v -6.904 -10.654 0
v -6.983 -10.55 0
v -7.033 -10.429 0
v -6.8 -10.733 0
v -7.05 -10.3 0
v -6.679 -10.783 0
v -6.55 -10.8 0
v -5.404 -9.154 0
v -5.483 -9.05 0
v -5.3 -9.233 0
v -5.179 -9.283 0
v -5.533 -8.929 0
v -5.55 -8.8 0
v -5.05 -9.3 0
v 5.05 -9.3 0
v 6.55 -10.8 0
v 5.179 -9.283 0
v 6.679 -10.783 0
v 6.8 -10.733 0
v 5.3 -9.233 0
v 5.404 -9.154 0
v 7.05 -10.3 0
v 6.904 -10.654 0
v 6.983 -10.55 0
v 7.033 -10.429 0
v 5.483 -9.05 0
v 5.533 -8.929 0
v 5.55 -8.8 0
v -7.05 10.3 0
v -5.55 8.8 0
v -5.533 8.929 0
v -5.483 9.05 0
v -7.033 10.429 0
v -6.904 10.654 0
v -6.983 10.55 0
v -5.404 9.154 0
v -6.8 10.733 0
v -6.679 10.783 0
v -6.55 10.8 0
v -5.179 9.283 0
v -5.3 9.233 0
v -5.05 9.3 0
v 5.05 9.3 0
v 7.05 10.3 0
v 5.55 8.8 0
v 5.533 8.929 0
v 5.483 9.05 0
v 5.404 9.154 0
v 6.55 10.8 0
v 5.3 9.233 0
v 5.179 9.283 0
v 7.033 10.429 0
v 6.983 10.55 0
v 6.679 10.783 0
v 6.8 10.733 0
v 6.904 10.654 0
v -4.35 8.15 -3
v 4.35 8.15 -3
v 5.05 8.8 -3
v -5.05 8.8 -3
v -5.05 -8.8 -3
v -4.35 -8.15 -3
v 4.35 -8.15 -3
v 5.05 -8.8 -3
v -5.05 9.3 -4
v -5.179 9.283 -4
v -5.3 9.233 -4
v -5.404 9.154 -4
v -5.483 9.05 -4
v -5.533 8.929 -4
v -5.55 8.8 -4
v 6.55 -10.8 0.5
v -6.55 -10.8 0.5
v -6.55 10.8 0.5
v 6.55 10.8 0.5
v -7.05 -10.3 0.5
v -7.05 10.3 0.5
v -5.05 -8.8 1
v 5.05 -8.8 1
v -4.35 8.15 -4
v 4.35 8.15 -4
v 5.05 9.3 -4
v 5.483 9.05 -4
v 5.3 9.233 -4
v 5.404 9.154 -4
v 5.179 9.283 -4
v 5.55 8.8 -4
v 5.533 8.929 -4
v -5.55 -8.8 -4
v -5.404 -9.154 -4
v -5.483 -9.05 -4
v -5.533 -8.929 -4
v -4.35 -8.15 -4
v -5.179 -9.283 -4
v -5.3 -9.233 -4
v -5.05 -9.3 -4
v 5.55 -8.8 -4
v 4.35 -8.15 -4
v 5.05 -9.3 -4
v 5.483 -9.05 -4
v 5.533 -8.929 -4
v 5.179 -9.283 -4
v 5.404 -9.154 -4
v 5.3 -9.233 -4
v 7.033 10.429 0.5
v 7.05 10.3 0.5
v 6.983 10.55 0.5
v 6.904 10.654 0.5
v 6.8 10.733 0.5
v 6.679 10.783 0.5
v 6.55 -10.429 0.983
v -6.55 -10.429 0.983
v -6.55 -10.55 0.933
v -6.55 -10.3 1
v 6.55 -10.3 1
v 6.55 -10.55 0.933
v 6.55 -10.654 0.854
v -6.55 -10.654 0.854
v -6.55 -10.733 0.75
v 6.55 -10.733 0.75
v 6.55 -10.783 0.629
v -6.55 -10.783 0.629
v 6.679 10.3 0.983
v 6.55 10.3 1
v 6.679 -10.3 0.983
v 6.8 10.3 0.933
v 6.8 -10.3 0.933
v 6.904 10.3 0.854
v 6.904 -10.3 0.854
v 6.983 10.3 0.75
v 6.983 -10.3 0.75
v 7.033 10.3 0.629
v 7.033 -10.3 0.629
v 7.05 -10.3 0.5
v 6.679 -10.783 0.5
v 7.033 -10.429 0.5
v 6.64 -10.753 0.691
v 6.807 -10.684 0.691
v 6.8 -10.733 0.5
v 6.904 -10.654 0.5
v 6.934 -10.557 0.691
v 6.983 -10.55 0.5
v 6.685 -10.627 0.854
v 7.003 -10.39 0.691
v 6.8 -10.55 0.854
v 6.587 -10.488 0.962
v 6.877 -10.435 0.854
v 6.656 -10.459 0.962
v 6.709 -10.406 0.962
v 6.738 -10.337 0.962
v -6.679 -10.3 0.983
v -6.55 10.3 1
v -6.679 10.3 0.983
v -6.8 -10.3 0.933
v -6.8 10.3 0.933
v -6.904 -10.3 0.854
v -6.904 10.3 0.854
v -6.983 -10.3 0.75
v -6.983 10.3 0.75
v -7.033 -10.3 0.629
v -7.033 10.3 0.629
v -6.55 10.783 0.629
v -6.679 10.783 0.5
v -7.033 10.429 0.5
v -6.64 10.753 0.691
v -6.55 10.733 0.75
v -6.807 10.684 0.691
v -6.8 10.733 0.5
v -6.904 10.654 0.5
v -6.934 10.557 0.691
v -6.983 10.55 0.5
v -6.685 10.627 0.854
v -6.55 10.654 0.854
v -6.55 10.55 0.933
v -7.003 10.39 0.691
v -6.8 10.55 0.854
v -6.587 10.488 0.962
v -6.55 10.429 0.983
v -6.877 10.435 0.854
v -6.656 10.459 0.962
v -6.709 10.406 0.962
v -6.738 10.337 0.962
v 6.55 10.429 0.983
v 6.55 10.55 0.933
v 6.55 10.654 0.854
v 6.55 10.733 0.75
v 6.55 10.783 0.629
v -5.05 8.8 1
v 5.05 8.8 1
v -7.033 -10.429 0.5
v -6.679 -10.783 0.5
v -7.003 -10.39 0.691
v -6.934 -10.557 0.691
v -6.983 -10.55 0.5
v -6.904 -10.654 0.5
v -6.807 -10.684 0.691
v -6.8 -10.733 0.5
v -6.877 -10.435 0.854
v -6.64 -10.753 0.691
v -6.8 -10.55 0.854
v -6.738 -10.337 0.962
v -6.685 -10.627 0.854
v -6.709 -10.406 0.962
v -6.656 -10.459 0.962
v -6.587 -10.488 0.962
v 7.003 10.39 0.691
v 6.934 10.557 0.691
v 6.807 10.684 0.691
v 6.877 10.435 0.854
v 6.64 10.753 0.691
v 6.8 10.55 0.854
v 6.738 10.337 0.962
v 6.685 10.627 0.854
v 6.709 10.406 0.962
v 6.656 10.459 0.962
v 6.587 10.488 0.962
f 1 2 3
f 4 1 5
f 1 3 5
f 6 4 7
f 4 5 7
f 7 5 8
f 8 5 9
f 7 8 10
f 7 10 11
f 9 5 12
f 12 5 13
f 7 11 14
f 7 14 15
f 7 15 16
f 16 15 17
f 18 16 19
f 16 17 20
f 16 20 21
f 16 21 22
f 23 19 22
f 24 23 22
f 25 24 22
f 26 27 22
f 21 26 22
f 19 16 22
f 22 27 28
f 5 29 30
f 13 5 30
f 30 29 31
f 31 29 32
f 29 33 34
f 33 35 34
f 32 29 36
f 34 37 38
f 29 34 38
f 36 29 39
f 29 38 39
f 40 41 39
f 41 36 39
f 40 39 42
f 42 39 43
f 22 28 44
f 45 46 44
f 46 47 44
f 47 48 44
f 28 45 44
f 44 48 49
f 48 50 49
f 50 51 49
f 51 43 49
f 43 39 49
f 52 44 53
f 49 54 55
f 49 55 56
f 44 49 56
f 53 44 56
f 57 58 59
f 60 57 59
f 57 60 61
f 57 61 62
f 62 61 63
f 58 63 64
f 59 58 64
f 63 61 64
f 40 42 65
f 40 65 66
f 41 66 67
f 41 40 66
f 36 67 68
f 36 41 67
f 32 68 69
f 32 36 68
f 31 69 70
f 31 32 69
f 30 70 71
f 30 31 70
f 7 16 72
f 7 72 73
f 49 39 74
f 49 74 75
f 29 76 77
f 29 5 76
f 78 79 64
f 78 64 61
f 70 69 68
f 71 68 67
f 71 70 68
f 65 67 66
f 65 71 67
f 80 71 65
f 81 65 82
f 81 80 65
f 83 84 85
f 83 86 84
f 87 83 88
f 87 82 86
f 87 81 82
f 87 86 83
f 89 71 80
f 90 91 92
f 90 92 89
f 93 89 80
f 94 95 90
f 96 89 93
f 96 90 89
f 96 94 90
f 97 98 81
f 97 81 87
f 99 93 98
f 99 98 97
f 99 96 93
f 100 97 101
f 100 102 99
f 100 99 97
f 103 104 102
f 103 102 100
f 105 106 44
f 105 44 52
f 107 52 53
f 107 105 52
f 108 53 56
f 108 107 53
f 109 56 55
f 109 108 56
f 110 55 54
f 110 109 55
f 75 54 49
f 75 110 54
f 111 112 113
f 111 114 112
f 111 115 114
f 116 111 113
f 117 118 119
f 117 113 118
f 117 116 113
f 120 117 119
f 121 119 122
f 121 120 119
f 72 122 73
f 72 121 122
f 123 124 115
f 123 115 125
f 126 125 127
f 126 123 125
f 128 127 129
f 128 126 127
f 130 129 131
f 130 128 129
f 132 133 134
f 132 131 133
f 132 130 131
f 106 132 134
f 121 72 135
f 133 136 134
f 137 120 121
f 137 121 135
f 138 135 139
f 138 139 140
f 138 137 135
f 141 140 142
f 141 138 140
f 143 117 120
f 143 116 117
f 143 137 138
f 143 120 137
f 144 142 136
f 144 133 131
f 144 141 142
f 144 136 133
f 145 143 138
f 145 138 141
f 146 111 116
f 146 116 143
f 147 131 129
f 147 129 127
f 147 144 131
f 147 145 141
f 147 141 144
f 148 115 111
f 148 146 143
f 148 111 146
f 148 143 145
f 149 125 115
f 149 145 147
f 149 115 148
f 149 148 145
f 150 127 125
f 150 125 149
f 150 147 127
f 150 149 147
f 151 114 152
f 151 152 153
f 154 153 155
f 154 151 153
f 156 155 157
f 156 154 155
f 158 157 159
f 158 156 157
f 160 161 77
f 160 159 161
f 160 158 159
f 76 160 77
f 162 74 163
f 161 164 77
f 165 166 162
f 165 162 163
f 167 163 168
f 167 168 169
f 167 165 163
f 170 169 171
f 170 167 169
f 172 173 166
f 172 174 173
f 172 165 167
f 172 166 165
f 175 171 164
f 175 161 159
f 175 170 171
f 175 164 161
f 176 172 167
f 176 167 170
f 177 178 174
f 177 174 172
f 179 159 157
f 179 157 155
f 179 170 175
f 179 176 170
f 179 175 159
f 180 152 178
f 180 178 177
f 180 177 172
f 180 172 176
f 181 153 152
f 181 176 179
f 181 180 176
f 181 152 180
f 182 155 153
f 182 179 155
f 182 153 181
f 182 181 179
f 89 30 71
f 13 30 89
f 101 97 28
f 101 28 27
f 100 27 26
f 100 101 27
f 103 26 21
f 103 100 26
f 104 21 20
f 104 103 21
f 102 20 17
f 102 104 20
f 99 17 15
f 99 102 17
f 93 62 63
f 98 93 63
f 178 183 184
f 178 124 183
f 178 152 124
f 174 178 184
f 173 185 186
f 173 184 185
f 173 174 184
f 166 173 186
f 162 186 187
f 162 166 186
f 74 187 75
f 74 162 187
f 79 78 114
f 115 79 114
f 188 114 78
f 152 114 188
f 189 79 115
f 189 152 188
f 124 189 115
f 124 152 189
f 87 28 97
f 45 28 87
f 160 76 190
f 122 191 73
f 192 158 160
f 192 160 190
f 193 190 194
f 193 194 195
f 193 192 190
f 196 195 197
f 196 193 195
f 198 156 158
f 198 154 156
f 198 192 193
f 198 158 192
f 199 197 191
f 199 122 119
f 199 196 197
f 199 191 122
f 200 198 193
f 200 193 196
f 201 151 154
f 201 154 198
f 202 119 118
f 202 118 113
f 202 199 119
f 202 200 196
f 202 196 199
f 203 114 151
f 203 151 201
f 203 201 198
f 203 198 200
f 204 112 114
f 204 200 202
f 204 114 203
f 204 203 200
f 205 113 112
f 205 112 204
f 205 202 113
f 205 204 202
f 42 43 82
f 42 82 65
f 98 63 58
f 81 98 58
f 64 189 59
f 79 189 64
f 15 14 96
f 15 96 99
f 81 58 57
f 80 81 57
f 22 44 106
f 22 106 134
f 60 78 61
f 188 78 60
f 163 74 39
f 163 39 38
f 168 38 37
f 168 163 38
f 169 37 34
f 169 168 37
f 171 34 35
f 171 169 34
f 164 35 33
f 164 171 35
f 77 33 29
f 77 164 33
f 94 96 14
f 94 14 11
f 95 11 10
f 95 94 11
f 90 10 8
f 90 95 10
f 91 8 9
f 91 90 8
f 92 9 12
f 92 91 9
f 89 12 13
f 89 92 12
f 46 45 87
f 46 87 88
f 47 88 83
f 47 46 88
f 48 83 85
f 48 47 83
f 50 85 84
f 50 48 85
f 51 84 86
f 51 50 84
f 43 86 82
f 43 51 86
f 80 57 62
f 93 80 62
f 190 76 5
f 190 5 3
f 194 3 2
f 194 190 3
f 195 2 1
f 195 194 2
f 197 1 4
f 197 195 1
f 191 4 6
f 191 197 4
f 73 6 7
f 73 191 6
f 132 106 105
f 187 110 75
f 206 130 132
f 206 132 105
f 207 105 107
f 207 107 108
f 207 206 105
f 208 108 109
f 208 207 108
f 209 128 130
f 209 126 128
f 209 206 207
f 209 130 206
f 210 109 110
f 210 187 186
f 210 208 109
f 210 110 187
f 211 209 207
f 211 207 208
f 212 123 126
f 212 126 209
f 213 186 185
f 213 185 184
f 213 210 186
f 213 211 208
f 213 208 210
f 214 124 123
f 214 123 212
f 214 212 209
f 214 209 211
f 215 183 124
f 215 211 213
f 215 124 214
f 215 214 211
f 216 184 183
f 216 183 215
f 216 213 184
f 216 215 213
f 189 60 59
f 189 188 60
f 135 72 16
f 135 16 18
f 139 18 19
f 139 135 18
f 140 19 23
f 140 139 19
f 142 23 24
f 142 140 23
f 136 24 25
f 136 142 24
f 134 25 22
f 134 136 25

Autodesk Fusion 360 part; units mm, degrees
sketch "Sketch1" plane through (0, 0, 0) normal (0, 0, 1) x (1, 0, 0)
  line L0 (5.55, 9.3) -> (-5.55, 9.3)
  line L1 (-5.55, 9.3) -> (-5.55, -9.3)
  line L2 (-5.55, -9.3) -> (5.55, -9.3)
  line L3 (5.55, -9.3) -> (5.55, 9.3)
  line L4 (5.55, 9.3) -> (-5.55, -9.3) construction
  line L5 (-5.55, 9.3) -> (5.55, -9.3) construction
  line L6 (7.05, -10.8) -> (-7.05, -10.8)
  line L7 (-7.05, -10.8) -> (-7.05, 10.8)
  line L8 (-7.05, 10.8) -> (7.05, 10.8)
  line L9 (7.05, 10.8) -> (7.05, -10.8)
  line L10 (7.05, -10.8) -> (-7.05, 10.8) construction
  line L11 (-7.05, -10.8) -> (7.05, 10.8) construction
  line L12 (5.05, -8.8) -> (-5.05, -8.8)
  line L13 (-5.05, -8.8) -> (-5.05, 8.8)
  line L14 (-5.05, 8.8) -> (5.05, 8.8)
  line L15 (5.05, 8.8) -> (5.05, -8.8)
  line L16 (5.05, -8.8) -> (-5.05, 8.8) construction
  line L17 (-5.05, -8.8) -> (5.05, 8.8) construction
  dimension "d1" = 11.1
  dimension "d2" = 18.6
  dimension "d3" = 14.1
  dimension "d4" = 21.6
  dimension "d5" = 10.1
  dimension "d6" = 17.6
extrude "Extrude1" add sketch "Sketch1" along normal blind 1 contours L0 L1 L2 L3 | L6 L7 L8 L9
extrude "Extrude2" add sketch "Sketch1" against normal blind 3 contours L0 L1 L2 L3
sketch "Sketch2" plane through (0, 0, -3) normal (0, 0, -1) x (1, 0, 0)
  line L0 (5.05, -8.8) -> (-5.05, -8.8)
  line L1 (-5.05, -8.8) -> (-5.05, 8.8)
  line L2 (-5.05, 8.8) -> (5.05, 8.8)
  line L3 (5.05, 8.8) -> (5.05, -8.8)
  line L4 (5.55, -9.3) -> (5.55, 9.3)
  line L5 (5.55, 9.3) -> (-5.55, 9.3)
  line L6 (-5.55, 9.3) -> (-5.55, -9.3)
  line L7 (-5.55, -9.3) -> (5.55, -9.3)
  line L8 (5.55, -9.3) -> (-5.55, -9.3)
  line L9 (-5.55, -9.3) -> (-5.55, 9.3)
  line L10 (-5.55, 9.3) -> (5.55, 9.3)
  line L11 (5.55, 9.3) -> (5.55, -9.3)
  line L12 (5.55, -9.3) -> (-5.55, 9.3) construction
  line L13 (-5.55, -9.3) -> (5.55, 9.3) construction
  line L14 (4.35, -8.15) -> (-4.35, -8.15)
  line L15 (-4.35, -8.15) -> (-4.35, 8.15)
  line L16 (-4.35, 8.15) -> (4.35, 8.15)
  line L17 (4.35, 8.15) -> (4.35, -8.15)
  line L18 (4.35, -8.15) -> (-4.35, 8.15) construction
  line L19 (-4.35, -8.15) -> (4.35, 8.15) construction
  dimension "d11" = 8.7
  dimension "d12" = 16.3
extrude "Extrude3" add sketch "Sketch2" along normal blind 1 contours L0 L1 L2 L3 | L4 L5 L6 L7 L8 L9 L10 L11
fillet "Fillet1" radius 0.5 8 edges at (-7.05, -10.8, 0.5) (7.05, -10.8, 0.5) (-5.55, -9.3, -2) (5.55, -9.3, -2) (-5.55, 9.3, -2) (-7.05, 10.8, 0.5) (5.55, 9.3, -2) (7.05, 10.8, 0.5)
fillet "Fillet2" radius 0.5 8 edges at (6.9036, -10.6536, 1) (7.05, 0, 1) (6.9036, 10.6536, 1) (0, 10.8, 1) (-6.9036, 10.6536, 1) (-7.05, 0, 1) (-6.9036, -10.6536, 1) (0, -10.8, 1)
